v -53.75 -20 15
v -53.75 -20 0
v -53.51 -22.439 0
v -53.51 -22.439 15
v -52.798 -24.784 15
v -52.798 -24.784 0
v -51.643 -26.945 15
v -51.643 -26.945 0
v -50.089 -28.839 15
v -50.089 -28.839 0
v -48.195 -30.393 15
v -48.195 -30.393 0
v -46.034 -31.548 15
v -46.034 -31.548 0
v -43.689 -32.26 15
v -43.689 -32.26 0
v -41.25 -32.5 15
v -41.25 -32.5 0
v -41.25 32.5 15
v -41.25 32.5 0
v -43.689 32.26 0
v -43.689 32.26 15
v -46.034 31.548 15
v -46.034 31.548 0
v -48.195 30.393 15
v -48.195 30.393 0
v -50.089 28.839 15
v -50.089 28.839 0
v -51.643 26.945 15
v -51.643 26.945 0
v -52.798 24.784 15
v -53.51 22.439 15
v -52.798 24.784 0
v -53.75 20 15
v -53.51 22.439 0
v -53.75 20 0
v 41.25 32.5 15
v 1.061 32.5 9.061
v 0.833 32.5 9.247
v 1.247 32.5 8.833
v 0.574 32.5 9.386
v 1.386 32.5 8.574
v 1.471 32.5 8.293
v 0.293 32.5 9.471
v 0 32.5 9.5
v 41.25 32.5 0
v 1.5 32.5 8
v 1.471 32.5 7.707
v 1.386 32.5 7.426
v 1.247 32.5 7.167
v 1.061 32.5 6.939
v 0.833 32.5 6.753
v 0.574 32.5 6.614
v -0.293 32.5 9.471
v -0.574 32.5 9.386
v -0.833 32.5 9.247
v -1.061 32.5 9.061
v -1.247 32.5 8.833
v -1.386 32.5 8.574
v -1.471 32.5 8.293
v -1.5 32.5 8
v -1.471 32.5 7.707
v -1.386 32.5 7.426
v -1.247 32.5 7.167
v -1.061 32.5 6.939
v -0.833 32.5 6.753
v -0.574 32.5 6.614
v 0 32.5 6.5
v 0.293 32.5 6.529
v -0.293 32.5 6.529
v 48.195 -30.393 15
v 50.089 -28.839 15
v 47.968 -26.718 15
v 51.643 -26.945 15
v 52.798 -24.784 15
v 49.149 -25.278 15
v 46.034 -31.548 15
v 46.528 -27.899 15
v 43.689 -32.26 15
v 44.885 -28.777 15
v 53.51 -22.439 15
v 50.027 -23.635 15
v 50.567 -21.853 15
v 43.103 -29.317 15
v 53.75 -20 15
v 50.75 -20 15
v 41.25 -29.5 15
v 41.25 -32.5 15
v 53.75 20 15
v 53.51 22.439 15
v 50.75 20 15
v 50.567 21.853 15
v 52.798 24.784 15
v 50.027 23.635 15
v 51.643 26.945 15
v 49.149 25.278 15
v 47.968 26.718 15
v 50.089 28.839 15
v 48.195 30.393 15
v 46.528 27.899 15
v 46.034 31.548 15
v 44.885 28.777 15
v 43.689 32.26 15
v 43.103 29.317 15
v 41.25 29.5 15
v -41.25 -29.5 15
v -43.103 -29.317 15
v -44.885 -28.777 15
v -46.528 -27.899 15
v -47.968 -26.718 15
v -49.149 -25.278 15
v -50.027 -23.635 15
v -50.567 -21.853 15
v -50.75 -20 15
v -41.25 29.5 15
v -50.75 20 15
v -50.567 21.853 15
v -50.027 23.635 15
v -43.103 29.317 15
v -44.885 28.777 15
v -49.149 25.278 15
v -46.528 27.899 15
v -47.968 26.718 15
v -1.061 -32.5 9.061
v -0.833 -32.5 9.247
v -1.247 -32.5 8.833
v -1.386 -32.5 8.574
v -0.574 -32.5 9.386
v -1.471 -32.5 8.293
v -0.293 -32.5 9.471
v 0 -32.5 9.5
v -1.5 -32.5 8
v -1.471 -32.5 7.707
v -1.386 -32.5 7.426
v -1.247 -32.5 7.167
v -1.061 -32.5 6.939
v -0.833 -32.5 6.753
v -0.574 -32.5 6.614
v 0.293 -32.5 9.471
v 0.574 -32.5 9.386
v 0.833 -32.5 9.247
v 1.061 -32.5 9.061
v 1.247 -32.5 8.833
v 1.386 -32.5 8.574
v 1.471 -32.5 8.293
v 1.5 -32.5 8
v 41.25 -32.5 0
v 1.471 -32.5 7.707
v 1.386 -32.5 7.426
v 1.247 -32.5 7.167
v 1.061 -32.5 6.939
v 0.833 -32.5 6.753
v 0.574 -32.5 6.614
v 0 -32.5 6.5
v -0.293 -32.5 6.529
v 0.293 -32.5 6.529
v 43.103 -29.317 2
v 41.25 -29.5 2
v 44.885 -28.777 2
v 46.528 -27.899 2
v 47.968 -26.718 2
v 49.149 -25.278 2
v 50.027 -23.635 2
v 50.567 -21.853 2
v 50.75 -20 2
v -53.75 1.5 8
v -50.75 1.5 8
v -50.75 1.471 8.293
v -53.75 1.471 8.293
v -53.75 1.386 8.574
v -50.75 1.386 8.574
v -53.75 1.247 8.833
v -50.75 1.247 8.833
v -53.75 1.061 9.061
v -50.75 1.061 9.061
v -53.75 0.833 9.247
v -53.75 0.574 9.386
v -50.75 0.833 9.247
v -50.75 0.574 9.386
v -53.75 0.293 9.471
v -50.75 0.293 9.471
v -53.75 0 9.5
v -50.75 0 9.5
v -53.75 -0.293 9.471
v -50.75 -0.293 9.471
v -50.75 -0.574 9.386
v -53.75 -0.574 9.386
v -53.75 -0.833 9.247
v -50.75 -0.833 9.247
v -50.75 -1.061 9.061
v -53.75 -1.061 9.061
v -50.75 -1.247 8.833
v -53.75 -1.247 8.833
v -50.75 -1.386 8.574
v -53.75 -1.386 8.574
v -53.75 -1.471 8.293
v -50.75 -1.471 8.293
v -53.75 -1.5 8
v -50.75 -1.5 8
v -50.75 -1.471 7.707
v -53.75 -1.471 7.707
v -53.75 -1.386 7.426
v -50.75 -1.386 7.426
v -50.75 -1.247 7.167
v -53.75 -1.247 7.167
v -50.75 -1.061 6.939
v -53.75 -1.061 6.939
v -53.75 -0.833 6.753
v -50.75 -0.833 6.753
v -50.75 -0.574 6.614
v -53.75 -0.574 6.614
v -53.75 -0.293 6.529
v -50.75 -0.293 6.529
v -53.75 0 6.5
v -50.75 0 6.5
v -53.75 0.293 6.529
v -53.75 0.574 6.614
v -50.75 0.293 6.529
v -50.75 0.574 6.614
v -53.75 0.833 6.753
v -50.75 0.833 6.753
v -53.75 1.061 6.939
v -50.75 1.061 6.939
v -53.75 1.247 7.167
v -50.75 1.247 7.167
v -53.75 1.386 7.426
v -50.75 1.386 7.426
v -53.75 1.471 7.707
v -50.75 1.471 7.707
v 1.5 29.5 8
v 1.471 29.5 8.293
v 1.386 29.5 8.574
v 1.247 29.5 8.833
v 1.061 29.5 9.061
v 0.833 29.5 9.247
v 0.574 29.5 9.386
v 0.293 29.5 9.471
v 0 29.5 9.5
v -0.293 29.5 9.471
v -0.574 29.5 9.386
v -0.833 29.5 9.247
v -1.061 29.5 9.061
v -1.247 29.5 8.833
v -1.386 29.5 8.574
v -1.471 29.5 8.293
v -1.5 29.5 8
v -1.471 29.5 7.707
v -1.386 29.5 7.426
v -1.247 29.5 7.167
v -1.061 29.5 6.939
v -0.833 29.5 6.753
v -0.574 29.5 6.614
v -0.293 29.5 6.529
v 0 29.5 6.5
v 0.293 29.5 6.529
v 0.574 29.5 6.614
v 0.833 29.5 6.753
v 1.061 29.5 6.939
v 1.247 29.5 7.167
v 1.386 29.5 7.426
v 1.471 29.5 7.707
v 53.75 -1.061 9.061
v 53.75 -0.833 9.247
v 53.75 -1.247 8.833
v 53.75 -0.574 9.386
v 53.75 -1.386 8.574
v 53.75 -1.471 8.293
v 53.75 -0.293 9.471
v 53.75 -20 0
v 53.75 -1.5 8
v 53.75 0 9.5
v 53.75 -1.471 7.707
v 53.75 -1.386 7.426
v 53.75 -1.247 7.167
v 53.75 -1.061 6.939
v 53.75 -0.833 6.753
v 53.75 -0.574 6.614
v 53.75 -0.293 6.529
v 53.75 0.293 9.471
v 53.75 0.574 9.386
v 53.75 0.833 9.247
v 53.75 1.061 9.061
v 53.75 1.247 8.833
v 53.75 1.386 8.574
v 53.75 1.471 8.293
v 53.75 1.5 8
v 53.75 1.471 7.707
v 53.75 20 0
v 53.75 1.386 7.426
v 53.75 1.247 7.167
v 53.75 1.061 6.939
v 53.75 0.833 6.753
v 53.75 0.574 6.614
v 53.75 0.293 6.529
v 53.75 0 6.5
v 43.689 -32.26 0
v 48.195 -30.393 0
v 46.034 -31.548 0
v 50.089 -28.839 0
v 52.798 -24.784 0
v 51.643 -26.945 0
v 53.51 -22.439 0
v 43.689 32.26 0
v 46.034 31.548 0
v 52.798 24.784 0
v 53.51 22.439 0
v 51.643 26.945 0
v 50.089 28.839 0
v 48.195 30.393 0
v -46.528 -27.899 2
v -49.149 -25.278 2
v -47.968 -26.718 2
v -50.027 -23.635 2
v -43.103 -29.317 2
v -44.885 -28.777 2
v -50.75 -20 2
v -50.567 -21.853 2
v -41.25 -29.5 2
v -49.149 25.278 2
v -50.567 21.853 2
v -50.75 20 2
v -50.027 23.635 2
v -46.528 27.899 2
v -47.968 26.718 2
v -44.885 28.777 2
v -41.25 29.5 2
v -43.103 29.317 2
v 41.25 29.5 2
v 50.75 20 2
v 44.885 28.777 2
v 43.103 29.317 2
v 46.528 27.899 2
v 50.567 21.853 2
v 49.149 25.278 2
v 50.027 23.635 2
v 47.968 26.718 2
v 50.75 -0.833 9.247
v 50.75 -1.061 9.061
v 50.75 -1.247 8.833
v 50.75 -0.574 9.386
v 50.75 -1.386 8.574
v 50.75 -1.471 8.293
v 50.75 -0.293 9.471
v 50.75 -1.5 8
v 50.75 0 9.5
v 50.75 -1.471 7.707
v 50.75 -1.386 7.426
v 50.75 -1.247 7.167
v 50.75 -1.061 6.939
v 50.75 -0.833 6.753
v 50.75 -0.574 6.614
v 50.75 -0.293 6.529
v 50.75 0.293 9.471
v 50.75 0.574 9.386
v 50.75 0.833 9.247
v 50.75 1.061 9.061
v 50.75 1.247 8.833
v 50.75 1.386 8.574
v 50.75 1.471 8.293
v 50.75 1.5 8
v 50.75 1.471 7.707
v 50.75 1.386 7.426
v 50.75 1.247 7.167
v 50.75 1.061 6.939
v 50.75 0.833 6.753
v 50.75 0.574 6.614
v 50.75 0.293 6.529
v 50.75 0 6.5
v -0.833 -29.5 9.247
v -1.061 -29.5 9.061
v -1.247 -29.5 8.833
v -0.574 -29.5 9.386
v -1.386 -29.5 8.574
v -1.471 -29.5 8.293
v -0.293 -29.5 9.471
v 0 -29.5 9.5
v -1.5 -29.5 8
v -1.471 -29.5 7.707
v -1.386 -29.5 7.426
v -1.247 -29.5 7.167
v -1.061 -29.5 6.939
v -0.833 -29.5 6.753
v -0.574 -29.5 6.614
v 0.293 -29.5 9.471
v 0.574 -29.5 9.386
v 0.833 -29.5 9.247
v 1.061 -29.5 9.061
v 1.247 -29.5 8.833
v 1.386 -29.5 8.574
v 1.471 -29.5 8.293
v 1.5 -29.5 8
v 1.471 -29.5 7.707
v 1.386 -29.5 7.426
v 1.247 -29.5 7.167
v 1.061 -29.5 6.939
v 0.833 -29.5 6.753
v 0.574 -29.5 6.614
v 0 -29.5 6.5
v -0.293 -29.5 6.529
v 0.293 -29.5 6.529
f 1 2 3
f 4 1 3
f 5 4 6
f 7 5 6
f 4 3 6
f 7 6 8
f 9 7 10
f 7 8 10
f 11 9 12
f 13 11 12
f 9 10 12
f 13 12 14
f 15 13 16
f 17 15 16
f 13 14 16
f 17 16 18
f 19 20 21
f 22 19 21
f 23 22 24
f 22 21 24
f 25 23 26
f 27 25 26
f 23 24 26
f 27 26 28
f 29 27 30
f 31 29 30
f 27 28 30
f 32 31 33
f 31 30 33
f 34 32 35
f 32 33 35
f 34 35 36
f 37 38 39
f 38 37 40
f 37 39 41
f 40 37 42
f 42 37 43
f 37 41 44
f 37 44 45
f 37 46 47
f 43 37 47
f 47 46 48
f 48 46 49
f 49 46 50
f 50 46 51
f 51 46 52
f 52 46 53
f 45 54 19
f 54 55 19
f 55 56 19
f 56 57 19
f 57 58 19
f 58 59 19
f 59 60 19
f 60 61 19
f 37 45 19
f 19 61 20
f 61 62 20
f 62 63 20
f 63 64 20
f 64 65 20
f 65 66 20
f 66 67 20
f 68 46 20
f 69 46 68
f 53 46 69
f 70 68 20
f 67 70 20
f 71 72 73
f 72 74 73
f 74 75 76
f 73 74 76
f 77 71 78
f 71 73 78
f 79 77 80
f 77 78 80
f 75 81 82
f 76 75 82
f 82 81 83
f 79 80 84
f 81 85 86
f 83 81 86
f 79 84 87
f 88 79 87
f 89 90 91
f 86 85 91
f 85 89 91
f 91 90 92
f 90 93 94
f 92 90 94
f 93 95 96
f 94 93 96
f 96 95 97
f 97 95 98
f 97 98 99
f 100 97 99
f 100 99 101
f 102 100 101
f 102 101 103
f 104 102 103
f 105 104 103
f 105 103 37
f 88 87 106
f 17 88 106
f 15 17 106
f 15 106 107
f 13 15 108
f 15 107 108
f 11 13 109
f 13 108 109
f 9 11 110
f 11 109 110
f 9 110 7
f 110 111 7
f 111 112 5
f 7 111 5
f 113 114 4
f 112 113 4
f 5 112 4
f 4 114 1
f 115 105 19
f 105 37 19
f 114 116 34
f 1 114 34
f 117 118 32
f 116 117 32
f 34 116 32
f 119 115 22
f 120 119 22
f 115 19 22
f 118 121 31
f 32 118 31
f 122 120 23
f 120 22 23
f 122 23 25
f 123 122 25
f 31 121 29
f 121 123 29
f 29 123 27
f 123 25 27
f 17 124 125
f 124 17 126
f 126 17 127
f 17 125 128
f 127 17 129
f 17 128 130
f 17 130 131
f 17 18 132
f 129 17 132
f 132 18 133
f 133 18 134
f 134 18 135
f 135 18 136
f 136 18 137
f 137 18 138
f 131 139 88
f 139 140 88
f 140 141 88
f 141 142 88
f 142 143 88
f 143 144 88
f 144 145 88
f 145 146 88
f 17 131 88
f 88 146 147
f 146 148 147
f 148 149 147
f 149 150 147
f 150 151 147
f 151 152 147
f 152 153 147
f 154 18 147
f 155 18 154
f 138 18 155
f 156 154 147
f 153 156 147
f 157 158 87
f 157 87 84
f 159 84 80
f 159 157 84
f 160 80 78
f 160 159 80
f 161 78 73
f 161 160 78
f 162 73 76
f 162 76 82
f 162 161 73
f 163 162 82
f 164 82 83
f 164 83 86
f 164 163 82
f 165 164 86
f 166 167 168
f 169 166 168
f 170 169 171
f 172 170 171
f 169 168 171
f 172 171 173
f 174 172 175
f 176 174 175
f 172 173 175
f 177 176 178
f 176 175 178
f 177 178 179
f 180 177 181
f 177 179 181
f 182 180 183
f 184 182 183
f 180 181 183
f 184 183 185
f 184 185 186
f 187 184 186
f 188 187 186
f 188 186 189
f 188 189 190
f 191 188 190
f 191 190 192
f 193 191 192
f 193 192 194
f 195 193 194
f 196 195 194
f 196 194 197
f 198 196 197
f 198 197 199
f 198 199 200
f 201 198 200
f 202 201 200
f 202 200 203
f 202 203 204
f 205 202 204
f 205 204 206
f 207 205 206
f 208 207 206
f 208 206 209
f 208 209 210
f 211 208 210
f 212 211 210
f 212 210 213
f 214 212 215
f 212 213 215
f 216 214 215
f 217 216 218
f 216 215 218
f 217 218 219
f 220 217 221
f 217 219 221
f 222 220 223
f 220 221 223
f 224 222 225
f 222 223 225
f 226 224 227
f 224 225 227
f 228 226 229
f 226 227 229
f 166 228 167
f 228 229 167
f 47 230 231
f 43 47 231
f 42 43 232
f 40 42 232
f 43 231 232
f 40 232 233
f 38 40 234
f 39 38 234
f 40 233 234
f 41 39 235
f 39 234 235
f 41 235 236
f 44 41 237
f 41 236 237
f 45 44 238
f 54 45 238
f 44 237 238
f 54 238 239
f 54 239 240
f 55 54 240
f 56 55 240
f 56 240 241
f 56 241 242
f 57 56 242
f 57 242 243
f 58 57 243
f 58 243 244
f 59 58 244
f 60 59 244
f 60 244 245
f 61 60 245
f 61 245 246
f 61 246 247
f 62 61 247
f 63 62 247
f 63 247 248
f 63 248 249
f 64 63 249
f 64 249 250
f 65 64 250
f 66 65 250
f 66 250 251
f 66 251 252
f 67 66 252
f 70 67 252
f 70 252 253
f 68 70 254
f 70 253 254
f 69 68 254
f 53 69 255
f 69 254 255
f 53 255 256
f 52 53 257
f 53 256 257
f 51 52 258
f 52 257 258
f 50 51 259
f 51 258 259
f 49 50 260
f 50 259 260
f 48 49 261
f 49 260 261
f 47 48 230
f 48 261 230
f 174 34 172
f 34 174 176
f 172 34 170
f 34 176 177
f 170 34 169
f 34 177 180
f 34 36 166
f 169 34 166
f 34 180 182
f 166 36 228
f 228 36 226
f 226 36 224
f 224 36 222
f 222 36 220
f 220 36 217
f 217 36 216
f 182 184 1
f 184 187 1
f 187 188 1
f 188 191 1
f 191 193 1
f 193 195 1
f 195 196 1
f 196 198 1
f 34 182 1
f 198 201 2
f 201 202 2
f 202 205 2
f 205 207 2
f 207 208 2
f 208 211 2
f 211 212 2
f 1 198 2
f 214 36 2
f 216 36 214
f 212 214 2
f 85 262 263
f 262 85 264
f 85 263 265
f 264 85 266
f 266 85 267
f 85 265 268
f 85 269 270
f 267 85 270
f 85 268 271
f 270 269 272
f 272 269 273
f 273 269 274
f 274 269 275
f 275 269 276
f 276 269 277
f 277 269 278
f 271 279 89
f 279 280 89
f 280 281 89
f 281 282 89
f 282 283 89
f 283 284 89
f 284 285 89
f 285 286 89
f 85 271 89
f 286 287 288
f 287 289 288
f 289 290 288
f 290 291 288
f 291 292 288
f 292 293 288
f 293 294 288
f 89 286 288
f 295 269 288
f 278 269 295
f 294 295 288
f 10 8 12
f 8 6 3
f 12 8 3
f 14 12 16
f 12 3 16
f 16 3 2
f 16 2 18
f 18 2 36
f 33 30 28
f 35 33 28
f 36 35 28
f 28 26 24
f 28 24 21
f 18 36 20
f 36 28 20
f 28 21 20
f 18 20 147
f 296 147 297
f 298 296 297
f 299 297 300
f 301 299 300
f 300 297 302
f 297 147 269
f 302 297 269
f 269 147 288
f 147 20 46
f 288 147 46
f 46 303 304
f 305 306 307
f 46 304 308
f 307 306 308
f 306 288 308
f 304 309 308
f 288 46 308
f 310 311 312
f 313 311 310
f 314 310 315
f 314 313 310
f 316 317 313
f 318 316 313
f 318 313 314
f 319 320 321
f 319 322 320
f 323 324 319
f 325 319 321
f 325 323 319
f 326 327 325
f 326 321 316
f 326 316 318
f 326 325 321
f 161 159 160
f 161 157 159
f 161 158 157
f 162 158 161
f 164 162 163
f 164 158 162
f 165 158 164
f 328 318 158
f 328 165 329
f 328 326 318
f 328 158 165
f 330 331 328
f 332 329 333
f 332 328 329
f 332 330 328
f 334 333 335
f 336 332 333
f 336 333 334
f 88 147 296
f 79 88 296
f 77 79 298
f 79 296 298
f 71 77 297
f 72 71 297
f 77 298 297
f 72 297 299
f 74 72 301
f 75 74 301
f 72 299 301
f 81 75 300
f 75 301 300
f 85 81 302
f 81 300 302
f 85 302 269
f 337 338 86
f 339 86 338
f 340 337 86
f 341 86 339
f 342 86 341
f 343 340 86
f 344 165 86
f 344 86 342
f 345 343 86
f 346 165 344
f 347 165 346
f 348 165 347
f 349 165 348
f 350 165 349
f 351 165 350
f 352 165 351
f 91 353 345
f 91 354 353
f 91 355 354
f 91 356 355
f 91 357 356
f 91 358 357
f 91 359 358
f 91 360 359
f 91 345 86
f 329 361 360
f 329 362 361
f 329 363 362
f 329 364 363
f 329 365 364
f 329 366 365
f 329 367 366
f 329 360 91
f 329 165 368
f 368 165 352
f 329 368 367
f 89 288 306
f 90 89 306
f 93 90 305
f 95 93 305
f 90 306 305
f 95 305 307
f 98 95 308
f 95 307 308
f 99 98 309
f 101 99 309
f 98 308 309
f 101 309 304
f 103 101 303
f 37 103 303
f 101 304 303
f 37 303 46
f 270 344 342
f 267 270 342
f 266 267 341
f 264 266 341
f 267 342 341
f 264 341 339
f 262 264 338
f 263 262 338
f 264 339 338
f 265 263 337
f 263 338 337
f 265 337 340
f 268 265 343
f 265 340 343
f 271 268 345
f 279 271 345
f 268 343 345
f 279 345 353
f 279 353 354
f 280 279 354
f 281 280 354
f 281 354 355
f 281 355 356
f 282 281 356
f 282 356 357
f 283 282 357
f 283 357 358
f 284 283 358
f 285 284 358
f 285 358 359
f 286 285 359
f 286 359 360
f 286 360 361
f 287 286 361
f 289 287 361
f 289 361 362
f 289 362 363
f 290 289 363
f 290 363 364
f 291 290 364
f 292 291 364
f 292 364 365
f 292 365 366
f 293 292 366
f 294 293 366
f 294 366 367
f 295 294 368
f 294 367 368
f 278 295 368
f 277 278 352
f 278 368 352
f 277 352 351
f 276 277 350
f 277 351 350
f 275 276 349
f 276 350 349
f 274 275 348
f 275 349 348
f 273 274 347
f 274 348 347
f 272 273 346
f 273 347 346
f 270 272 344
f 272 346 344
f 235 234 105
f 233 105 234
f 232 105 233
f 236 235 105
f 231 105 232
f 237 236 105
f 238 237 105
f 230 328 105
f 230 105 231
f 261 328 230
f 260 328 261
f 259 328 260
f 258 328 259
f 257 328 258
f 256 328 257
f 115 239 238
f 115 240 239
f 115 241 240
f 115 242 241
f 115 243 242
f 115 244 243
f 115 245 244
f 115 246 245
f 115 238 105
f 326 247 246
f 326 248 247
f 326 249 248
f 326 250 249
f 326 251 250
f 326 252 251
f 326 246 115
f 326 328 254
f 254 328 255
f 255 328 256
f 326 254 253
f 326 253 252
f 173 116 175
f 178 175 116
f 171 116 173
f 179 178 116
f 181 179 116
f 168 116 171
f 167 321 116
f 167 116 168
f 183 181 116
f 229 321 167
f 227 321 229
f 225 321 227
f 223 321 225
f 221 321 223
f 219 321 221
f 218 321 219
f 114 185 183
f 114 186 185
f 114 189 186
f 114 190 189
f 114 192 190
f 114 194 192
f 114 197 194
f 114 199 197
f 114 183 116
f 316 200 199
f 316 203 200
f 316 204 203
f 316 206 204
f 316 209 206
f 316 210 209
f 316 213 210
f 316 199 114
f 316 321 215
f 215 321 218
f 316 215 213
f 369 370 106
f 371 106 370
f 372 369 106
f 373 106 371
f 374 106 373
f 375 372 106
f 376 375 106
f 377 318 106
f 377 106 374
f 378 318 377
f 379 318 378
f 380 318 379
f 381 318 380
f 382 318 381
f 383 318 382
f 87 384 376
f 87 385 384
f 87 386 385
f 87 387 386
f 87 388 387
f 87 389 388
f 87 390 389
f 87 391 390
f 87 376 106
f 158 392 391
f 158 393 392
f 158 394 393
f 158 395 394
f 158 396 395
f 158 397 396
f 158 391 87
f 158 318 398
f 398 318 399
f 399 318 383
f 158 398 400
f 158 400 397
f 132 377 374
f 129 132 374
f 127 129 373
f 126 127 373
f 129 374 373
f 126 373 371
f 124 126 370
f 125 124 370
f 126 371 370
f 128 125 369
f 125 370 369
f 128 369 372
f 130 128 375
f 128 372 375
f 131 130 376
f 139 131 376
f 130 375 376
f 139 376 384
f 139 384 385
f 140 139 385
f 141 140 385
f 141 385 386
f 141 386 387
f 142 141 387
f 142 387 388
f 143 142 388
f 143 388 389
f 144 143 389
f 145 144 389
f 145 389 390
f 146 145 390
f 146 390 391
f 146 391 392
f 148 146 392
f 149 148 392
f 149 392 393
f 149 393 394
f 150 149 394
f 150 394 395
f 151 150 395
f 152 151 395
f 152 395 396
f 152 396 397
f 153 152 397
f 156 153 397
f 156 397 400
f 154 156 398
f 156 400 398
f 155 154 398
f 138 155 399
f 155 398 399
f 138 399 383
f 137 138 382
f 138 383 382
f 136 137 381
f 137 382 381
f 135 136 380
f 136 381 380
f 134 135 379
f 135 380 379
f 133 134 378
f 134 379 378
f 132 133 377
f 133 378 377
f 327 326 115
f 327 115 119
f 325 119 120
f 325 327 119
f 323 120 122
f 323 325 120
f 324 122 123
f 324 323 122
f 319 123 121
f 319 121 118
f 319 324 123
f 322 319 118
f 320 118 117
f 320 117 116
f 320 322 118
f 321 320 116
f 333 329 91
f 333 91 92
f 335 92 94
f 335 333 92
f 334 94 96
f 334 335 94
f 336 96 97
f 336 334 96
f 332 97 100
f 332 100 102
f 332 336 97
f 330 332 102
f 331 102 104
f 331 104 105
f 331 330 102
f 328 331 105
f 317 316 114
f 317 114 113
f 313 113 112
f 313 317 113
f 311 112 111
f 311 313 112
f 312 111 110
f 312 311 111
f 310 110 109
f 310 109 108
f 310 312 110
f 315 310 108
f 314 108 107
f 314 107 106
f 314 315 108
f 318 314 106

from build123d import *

# Parameters (mm, degrees)
PAD001_DEPTH       = 2
PAD003_DEPTH       = 15
SKETCH_R           = 1.5
POCKET_DEPTH       = 285.532619
POLARPATTERN_COUNT = 4


with BuildPart() as part:
    # Sketch001 → Pad001 (new body)
    with BuildSketch(Plane.XY):
        with BuildLine():
            Line((-53.75, 20), (-53.75, -20))
            ThreePointArc((-53.75, -20), (-50.088835, -28.838835), (-41.25, -32.5))
            Line((-41.25, -32.5), (41.25, -32.5))
            ThreePointArc((41.25, -32.5), (50.088835, -28.838835), (53.75, -20))
            Line((53.75, -20), (53.75, 20))
            ThreePointArc((53.75, 20), (50.088835, 28.838835), (41.25, 32.5))
            Line((41.25, 32.5), (-41.25, 32.5))
            ThreePointArc((-41.25, 32.5), (-50.088835, 28.838835), (-53.75, 20))
        make_face()
    extrude(amount=PAD001_DEPTH)

    # Sketch003 → Pad003 (join)
    with BuildSketch(Plane.XY):
        with BuildLine():
            Line((-41.25, 32.5), (41.25, 32.5))
            ThreePointArc((53.75, 20), (50.088835, 28.838835), (41.25, 32.5))
            Line((53.75, 20), (53.75, -20))
            ThreePointArc((41.25, -32.5), (50.088835, -28.838835), (53.75, -20))
            Line((41.25, -32.5), (-41.25, -32.5))
            ThreePointArc((-53.75, -20), (-50.088835, -28.838835), (-41.25, -32.5))
            Line((-53.75, -20), (-53.75, 20))
            ThreePointArc((-41.25, 32.5), (-50.088835, 28.838835), (-53.75, 20))
        make_face()
        with BuildLine():
            Line((-50.75, 20), (-50.75, -20))
            ThreePointArc((-50.75, -20), (-47.967514, -26.717514), (-41.25, -29.5))
            Line((-41.25, -29.5), (41.25, -29.5))
            ThreePointArc((41.25, -29.5), (47.967514, -26.717514), (50.75, -20))
            Line((50.75, -20), (50.75, 20))
            ThreePointArc((50.75, 20), (47.967514, 26.717514), (41.25, 29.5))
            Line((41.25, 29.5), (-41.25, 29.5))
            ThreePointArc((-41.25, 29.5), (-47.967514, 26.717514), (-50.75, 20))
        make_face(mode=Mode.SUBTRACT)
    extrude(amount=PAD003_DEPTH)

    # Sketch → Pocket (cut, through all)
    with BuildSketch(Plane.XZ):
        with Locations((0, 8)):
            Circle(SKETCH_R)
    pocket = extrude(amount=-POCKET_DEPTH, mode=Mode.SUBTRACT)

    # PolarPattern: Pocket ×4 about axis
    polarpattern_axis = Axis((0, 0, 0), (0, 0, 1))
    for i in range(1, POLARPATTERN_COUNT):
        add(pocket.rotate(polarpattern_axis, i * 360 / POLARPATTERN_COUNT), mode=Mode.SUBTRACT)


solid = part.part
